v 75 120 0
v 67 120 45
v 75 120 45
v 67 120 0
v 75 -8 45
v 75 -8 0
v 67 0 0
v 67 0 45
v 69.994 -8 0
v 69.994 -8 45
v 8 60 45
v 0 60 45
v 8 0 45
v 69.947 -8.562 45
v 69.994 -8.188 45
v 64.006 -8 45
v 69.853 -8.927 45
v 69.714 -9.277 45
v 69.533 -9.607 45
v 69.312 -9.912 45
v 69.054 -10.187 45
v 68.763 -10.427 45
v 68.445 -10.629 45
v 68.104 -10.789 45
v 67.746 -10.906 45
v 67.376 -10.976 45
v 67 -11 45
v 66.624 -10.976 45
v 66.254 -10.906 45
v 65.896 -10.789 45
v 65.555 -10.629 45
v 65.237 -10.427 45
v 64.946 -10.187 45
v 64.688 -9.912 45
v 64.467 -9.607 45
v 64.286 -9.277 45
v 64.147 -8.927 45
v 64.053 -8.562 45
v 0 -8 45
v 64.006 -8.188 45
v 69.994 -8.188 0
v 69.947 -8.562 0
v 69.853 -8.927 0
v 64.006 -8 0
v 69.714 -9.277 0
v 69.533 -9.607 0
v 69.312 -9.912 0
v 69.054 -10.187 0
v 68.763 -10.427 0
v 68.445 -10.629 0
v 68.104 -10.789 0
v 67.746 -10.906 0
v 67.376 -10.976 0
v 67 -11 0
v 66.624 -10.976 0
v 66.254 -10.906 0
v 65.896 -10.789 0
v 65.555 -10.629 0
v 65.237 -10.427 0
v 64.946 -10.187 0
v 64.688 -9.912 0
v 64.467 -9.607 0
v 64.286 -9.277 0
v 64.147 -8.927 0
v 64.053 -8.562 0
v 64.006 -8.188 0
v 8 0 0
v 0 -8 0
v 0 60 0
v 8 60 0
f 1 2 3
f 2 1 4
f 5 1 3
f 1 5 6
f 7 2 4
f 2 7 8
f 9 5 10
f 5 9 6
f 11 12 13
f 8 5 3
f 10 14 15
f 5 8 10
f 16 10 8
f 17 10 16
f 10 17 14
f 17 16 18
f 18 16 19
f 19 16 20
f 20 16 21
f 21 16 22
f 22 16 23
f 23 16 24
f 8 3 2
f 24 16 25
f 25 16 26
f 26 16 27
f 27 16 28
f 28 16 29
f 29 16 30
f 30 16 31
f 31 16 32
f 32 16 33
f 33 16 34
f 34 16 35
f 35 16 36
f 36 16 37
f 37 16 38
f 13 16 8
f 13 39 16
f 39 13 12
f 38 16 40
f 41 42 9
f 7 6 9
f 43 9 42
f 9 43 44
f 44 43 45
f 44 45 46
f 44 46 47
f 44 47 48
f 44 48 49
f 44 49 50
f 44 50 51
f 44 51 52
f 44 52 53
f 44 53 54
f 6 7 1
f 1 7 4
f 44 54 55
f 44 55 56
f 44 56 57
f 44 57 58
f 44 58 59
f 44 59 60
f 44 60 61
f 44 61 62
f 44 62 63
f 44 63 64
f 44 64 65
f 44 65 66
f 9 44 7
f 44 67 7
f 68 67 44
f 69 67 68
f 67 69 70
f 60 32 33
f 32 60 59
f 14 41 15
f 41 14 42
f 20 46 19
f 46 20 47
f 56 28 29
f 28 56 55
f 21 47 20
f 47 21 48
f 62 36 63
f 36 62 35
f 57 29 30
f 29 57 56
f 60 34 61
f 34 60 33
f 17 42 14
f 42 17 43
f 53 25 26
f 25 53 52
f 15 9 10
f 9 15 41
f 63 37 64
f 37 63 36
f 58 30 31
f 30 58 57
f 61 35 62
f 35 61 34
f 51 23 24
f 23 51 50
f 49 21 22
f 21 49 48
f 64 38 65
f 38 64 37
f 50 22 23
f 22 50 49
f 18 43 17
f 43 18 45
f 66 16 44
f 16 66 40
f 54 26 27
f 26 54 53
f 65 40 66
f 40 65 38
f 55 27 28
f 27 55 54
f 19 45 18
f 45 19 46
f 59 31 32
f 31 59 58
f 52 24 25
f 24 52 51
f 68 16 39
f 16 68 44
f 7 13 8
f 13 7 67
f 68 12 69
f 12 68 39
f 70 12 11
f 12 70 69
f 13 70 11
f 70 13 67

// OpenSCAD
// preview[view:north east, tilt:top diagonal]

// width of hook
hook_width = 45; //[5:100]

// thickness of part
hook_thick = 8; //[1:10]

// length of top we hang on
hook_top = 59; //[5:100]

// length of overhang latch (twice as long on hanger side)
hook_latch = 60; //[5:100]

// angle of the tongue
hook_angle = 35; //[0:55]

// length of the tongue that sticks out
hook_tongue = 100; //[0:100]

coathook(hook_width, hook_thick, hook_top, hook_latch, hook_angle, hook_tongue);

module coathook(hookwidth, hookthick, hooktop, hooklatch, hookangle, hooktongue) {
  rotate ([90,0,0]) union () {
    // Top
    cube ([hooktop+hookthick, hookwidth, hookthick]);
      
    // Back
    rotate ([0,90,0]) cube ([hooklatch, hookwidth, hookthick]);
      
    // Front
    rotate ([0,90,0]) {
      translate ([-hookthick, 0, hooktop+hookthick]) {
          
        union (){
          cube ([(hooklatch*2) + hookthick, hookwidth, hookthick]);
          rotate ([-90,0,0]) 
            #cylinder (h = hookwidth, r = (hookthick / 4) + 1, $fn = 50);
        }
        //union () {
          //cube ([(hooklatch*2) + hookthick, hookwidth, hookthick]);
              //translate ([(hooklatch*2) + hookthick, 0, hookthick]) 
              //  rotate ([0,-90-hookangle,0]) 
              //    #cube ([hooktongue, hookwidth, hookthick]);
              //translate ([(hooklatch*2) - hookthick/2, 0, hookthick])
              //  rotate ([-90,0,0]) 
              //    #cylinder (
              //      h = hookwidth, 
              //      r = (hookthick / 2) + 1, 
              //      $fn = 50);
        //}
      }
    }
  }
}
